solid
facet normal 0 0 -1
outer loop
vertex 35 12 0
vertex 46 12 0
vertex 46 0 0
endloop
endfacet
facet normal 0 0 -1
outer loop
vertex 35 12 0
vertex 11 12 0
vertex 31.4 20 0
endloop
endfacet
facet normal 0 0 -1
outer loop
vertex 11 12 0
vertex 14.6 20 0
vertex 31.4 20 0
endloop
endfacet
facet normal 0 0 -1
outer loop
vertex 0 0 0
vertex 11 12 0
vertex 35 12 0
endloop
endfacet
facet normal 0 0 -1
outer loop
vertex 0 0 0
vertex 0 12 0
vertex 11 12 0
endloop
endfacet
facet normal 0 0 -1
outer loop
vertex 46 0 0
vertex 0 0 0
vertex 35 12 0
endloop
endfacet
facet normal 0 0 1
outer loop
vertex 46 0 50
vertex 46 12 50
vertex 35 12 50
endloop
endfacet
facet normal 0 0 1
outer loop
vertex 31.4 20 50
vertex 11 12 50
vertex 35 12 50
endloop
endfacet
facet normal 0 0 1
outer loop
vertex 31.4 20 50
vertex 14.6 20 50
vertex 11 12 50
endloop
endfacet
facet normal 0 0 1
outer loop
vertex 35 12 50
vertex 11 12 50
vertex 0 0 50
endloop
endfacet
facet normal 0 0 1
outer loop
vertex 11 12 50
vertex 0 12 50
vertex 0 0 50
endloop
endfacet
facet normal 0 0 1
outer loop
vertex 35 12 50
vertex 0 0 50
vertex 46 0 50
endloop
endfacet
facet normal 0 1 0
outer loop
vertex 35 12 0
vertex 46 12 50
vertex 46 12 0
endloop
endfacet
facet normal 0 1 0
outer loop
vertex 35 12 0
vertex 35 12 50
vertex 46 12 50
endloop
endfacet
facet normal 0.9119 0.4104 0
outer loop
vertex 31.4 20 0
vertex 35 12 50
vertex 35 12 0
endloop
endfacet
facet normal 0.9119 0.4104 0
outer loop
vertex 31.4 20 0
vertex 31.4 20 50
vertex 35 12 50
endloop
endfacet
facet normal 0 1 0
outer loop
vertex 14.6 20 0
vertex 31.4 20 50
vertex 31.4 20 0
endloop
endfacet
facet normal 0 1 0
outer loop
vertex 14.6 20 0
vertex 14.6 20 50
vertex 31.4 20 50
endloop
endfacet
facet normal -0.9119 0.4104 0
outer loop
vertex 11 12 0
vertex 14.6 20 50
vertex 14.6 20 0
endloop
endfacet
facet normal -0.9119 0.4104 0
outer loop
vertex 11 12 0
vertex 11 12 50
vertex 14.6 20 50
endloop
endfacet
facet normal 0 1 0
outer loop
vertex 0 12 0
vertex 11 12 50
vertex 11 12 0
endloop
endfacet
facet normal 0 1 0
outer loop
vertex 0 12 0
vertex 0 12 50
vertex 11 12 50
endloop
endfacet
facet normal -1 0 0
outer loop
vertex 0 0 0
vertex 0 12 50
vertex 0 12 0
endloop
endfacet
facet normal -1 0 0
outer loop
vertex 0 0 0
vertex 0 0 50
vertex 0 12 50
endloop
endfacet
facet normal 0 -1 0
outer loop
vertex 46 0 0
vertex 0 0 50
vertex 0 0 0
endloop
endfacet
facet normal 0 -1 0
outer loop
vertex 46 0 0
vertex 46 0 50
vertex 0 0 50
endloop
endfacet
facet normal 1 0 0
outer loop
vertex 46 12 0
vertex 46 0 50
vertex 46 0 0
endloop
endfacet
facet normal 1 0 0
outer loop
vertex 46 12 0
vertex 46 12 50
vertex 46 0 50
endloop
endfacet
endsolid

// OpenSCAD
$fn = 32;

// ----------------------------------------------------------------------
// V guide rail: dovetail, 46 mm wide
// ----------------------------------------------------------------------

// --- parameters (mm) ---
rail_w = 46;              // rail width, X
base_t = 12;              // base plate thickness
v_depth = 8;              // V feature depth / height
v_half_w = 12;            // half width of the V at the base face
plate_t = 50;             // rail length, Z (the extrusion height)
top_half_w = 8.4;         // half width at the dovetail top
fit_tol = 0.02;           // declared fit tolerance (prompt contract)
free_tol = 0.2;           // declared free tolerance (prompt contract)

dovetail_base = 2 * v_half_w;  // dovetail width at the base
dovetail_top = 2 * top_half_w;  // dovetail width at the top

profile = [[0, 0], [46, 0], [46, 12], [35, 12], [31.4, 20], [14.6, 20], [11, 12], [0, 12]];  // primary outline, 8 points, counter clockwise

// --- the one profile operation ---
linear_extrude(height = plate_t) polygon(points = profile);
